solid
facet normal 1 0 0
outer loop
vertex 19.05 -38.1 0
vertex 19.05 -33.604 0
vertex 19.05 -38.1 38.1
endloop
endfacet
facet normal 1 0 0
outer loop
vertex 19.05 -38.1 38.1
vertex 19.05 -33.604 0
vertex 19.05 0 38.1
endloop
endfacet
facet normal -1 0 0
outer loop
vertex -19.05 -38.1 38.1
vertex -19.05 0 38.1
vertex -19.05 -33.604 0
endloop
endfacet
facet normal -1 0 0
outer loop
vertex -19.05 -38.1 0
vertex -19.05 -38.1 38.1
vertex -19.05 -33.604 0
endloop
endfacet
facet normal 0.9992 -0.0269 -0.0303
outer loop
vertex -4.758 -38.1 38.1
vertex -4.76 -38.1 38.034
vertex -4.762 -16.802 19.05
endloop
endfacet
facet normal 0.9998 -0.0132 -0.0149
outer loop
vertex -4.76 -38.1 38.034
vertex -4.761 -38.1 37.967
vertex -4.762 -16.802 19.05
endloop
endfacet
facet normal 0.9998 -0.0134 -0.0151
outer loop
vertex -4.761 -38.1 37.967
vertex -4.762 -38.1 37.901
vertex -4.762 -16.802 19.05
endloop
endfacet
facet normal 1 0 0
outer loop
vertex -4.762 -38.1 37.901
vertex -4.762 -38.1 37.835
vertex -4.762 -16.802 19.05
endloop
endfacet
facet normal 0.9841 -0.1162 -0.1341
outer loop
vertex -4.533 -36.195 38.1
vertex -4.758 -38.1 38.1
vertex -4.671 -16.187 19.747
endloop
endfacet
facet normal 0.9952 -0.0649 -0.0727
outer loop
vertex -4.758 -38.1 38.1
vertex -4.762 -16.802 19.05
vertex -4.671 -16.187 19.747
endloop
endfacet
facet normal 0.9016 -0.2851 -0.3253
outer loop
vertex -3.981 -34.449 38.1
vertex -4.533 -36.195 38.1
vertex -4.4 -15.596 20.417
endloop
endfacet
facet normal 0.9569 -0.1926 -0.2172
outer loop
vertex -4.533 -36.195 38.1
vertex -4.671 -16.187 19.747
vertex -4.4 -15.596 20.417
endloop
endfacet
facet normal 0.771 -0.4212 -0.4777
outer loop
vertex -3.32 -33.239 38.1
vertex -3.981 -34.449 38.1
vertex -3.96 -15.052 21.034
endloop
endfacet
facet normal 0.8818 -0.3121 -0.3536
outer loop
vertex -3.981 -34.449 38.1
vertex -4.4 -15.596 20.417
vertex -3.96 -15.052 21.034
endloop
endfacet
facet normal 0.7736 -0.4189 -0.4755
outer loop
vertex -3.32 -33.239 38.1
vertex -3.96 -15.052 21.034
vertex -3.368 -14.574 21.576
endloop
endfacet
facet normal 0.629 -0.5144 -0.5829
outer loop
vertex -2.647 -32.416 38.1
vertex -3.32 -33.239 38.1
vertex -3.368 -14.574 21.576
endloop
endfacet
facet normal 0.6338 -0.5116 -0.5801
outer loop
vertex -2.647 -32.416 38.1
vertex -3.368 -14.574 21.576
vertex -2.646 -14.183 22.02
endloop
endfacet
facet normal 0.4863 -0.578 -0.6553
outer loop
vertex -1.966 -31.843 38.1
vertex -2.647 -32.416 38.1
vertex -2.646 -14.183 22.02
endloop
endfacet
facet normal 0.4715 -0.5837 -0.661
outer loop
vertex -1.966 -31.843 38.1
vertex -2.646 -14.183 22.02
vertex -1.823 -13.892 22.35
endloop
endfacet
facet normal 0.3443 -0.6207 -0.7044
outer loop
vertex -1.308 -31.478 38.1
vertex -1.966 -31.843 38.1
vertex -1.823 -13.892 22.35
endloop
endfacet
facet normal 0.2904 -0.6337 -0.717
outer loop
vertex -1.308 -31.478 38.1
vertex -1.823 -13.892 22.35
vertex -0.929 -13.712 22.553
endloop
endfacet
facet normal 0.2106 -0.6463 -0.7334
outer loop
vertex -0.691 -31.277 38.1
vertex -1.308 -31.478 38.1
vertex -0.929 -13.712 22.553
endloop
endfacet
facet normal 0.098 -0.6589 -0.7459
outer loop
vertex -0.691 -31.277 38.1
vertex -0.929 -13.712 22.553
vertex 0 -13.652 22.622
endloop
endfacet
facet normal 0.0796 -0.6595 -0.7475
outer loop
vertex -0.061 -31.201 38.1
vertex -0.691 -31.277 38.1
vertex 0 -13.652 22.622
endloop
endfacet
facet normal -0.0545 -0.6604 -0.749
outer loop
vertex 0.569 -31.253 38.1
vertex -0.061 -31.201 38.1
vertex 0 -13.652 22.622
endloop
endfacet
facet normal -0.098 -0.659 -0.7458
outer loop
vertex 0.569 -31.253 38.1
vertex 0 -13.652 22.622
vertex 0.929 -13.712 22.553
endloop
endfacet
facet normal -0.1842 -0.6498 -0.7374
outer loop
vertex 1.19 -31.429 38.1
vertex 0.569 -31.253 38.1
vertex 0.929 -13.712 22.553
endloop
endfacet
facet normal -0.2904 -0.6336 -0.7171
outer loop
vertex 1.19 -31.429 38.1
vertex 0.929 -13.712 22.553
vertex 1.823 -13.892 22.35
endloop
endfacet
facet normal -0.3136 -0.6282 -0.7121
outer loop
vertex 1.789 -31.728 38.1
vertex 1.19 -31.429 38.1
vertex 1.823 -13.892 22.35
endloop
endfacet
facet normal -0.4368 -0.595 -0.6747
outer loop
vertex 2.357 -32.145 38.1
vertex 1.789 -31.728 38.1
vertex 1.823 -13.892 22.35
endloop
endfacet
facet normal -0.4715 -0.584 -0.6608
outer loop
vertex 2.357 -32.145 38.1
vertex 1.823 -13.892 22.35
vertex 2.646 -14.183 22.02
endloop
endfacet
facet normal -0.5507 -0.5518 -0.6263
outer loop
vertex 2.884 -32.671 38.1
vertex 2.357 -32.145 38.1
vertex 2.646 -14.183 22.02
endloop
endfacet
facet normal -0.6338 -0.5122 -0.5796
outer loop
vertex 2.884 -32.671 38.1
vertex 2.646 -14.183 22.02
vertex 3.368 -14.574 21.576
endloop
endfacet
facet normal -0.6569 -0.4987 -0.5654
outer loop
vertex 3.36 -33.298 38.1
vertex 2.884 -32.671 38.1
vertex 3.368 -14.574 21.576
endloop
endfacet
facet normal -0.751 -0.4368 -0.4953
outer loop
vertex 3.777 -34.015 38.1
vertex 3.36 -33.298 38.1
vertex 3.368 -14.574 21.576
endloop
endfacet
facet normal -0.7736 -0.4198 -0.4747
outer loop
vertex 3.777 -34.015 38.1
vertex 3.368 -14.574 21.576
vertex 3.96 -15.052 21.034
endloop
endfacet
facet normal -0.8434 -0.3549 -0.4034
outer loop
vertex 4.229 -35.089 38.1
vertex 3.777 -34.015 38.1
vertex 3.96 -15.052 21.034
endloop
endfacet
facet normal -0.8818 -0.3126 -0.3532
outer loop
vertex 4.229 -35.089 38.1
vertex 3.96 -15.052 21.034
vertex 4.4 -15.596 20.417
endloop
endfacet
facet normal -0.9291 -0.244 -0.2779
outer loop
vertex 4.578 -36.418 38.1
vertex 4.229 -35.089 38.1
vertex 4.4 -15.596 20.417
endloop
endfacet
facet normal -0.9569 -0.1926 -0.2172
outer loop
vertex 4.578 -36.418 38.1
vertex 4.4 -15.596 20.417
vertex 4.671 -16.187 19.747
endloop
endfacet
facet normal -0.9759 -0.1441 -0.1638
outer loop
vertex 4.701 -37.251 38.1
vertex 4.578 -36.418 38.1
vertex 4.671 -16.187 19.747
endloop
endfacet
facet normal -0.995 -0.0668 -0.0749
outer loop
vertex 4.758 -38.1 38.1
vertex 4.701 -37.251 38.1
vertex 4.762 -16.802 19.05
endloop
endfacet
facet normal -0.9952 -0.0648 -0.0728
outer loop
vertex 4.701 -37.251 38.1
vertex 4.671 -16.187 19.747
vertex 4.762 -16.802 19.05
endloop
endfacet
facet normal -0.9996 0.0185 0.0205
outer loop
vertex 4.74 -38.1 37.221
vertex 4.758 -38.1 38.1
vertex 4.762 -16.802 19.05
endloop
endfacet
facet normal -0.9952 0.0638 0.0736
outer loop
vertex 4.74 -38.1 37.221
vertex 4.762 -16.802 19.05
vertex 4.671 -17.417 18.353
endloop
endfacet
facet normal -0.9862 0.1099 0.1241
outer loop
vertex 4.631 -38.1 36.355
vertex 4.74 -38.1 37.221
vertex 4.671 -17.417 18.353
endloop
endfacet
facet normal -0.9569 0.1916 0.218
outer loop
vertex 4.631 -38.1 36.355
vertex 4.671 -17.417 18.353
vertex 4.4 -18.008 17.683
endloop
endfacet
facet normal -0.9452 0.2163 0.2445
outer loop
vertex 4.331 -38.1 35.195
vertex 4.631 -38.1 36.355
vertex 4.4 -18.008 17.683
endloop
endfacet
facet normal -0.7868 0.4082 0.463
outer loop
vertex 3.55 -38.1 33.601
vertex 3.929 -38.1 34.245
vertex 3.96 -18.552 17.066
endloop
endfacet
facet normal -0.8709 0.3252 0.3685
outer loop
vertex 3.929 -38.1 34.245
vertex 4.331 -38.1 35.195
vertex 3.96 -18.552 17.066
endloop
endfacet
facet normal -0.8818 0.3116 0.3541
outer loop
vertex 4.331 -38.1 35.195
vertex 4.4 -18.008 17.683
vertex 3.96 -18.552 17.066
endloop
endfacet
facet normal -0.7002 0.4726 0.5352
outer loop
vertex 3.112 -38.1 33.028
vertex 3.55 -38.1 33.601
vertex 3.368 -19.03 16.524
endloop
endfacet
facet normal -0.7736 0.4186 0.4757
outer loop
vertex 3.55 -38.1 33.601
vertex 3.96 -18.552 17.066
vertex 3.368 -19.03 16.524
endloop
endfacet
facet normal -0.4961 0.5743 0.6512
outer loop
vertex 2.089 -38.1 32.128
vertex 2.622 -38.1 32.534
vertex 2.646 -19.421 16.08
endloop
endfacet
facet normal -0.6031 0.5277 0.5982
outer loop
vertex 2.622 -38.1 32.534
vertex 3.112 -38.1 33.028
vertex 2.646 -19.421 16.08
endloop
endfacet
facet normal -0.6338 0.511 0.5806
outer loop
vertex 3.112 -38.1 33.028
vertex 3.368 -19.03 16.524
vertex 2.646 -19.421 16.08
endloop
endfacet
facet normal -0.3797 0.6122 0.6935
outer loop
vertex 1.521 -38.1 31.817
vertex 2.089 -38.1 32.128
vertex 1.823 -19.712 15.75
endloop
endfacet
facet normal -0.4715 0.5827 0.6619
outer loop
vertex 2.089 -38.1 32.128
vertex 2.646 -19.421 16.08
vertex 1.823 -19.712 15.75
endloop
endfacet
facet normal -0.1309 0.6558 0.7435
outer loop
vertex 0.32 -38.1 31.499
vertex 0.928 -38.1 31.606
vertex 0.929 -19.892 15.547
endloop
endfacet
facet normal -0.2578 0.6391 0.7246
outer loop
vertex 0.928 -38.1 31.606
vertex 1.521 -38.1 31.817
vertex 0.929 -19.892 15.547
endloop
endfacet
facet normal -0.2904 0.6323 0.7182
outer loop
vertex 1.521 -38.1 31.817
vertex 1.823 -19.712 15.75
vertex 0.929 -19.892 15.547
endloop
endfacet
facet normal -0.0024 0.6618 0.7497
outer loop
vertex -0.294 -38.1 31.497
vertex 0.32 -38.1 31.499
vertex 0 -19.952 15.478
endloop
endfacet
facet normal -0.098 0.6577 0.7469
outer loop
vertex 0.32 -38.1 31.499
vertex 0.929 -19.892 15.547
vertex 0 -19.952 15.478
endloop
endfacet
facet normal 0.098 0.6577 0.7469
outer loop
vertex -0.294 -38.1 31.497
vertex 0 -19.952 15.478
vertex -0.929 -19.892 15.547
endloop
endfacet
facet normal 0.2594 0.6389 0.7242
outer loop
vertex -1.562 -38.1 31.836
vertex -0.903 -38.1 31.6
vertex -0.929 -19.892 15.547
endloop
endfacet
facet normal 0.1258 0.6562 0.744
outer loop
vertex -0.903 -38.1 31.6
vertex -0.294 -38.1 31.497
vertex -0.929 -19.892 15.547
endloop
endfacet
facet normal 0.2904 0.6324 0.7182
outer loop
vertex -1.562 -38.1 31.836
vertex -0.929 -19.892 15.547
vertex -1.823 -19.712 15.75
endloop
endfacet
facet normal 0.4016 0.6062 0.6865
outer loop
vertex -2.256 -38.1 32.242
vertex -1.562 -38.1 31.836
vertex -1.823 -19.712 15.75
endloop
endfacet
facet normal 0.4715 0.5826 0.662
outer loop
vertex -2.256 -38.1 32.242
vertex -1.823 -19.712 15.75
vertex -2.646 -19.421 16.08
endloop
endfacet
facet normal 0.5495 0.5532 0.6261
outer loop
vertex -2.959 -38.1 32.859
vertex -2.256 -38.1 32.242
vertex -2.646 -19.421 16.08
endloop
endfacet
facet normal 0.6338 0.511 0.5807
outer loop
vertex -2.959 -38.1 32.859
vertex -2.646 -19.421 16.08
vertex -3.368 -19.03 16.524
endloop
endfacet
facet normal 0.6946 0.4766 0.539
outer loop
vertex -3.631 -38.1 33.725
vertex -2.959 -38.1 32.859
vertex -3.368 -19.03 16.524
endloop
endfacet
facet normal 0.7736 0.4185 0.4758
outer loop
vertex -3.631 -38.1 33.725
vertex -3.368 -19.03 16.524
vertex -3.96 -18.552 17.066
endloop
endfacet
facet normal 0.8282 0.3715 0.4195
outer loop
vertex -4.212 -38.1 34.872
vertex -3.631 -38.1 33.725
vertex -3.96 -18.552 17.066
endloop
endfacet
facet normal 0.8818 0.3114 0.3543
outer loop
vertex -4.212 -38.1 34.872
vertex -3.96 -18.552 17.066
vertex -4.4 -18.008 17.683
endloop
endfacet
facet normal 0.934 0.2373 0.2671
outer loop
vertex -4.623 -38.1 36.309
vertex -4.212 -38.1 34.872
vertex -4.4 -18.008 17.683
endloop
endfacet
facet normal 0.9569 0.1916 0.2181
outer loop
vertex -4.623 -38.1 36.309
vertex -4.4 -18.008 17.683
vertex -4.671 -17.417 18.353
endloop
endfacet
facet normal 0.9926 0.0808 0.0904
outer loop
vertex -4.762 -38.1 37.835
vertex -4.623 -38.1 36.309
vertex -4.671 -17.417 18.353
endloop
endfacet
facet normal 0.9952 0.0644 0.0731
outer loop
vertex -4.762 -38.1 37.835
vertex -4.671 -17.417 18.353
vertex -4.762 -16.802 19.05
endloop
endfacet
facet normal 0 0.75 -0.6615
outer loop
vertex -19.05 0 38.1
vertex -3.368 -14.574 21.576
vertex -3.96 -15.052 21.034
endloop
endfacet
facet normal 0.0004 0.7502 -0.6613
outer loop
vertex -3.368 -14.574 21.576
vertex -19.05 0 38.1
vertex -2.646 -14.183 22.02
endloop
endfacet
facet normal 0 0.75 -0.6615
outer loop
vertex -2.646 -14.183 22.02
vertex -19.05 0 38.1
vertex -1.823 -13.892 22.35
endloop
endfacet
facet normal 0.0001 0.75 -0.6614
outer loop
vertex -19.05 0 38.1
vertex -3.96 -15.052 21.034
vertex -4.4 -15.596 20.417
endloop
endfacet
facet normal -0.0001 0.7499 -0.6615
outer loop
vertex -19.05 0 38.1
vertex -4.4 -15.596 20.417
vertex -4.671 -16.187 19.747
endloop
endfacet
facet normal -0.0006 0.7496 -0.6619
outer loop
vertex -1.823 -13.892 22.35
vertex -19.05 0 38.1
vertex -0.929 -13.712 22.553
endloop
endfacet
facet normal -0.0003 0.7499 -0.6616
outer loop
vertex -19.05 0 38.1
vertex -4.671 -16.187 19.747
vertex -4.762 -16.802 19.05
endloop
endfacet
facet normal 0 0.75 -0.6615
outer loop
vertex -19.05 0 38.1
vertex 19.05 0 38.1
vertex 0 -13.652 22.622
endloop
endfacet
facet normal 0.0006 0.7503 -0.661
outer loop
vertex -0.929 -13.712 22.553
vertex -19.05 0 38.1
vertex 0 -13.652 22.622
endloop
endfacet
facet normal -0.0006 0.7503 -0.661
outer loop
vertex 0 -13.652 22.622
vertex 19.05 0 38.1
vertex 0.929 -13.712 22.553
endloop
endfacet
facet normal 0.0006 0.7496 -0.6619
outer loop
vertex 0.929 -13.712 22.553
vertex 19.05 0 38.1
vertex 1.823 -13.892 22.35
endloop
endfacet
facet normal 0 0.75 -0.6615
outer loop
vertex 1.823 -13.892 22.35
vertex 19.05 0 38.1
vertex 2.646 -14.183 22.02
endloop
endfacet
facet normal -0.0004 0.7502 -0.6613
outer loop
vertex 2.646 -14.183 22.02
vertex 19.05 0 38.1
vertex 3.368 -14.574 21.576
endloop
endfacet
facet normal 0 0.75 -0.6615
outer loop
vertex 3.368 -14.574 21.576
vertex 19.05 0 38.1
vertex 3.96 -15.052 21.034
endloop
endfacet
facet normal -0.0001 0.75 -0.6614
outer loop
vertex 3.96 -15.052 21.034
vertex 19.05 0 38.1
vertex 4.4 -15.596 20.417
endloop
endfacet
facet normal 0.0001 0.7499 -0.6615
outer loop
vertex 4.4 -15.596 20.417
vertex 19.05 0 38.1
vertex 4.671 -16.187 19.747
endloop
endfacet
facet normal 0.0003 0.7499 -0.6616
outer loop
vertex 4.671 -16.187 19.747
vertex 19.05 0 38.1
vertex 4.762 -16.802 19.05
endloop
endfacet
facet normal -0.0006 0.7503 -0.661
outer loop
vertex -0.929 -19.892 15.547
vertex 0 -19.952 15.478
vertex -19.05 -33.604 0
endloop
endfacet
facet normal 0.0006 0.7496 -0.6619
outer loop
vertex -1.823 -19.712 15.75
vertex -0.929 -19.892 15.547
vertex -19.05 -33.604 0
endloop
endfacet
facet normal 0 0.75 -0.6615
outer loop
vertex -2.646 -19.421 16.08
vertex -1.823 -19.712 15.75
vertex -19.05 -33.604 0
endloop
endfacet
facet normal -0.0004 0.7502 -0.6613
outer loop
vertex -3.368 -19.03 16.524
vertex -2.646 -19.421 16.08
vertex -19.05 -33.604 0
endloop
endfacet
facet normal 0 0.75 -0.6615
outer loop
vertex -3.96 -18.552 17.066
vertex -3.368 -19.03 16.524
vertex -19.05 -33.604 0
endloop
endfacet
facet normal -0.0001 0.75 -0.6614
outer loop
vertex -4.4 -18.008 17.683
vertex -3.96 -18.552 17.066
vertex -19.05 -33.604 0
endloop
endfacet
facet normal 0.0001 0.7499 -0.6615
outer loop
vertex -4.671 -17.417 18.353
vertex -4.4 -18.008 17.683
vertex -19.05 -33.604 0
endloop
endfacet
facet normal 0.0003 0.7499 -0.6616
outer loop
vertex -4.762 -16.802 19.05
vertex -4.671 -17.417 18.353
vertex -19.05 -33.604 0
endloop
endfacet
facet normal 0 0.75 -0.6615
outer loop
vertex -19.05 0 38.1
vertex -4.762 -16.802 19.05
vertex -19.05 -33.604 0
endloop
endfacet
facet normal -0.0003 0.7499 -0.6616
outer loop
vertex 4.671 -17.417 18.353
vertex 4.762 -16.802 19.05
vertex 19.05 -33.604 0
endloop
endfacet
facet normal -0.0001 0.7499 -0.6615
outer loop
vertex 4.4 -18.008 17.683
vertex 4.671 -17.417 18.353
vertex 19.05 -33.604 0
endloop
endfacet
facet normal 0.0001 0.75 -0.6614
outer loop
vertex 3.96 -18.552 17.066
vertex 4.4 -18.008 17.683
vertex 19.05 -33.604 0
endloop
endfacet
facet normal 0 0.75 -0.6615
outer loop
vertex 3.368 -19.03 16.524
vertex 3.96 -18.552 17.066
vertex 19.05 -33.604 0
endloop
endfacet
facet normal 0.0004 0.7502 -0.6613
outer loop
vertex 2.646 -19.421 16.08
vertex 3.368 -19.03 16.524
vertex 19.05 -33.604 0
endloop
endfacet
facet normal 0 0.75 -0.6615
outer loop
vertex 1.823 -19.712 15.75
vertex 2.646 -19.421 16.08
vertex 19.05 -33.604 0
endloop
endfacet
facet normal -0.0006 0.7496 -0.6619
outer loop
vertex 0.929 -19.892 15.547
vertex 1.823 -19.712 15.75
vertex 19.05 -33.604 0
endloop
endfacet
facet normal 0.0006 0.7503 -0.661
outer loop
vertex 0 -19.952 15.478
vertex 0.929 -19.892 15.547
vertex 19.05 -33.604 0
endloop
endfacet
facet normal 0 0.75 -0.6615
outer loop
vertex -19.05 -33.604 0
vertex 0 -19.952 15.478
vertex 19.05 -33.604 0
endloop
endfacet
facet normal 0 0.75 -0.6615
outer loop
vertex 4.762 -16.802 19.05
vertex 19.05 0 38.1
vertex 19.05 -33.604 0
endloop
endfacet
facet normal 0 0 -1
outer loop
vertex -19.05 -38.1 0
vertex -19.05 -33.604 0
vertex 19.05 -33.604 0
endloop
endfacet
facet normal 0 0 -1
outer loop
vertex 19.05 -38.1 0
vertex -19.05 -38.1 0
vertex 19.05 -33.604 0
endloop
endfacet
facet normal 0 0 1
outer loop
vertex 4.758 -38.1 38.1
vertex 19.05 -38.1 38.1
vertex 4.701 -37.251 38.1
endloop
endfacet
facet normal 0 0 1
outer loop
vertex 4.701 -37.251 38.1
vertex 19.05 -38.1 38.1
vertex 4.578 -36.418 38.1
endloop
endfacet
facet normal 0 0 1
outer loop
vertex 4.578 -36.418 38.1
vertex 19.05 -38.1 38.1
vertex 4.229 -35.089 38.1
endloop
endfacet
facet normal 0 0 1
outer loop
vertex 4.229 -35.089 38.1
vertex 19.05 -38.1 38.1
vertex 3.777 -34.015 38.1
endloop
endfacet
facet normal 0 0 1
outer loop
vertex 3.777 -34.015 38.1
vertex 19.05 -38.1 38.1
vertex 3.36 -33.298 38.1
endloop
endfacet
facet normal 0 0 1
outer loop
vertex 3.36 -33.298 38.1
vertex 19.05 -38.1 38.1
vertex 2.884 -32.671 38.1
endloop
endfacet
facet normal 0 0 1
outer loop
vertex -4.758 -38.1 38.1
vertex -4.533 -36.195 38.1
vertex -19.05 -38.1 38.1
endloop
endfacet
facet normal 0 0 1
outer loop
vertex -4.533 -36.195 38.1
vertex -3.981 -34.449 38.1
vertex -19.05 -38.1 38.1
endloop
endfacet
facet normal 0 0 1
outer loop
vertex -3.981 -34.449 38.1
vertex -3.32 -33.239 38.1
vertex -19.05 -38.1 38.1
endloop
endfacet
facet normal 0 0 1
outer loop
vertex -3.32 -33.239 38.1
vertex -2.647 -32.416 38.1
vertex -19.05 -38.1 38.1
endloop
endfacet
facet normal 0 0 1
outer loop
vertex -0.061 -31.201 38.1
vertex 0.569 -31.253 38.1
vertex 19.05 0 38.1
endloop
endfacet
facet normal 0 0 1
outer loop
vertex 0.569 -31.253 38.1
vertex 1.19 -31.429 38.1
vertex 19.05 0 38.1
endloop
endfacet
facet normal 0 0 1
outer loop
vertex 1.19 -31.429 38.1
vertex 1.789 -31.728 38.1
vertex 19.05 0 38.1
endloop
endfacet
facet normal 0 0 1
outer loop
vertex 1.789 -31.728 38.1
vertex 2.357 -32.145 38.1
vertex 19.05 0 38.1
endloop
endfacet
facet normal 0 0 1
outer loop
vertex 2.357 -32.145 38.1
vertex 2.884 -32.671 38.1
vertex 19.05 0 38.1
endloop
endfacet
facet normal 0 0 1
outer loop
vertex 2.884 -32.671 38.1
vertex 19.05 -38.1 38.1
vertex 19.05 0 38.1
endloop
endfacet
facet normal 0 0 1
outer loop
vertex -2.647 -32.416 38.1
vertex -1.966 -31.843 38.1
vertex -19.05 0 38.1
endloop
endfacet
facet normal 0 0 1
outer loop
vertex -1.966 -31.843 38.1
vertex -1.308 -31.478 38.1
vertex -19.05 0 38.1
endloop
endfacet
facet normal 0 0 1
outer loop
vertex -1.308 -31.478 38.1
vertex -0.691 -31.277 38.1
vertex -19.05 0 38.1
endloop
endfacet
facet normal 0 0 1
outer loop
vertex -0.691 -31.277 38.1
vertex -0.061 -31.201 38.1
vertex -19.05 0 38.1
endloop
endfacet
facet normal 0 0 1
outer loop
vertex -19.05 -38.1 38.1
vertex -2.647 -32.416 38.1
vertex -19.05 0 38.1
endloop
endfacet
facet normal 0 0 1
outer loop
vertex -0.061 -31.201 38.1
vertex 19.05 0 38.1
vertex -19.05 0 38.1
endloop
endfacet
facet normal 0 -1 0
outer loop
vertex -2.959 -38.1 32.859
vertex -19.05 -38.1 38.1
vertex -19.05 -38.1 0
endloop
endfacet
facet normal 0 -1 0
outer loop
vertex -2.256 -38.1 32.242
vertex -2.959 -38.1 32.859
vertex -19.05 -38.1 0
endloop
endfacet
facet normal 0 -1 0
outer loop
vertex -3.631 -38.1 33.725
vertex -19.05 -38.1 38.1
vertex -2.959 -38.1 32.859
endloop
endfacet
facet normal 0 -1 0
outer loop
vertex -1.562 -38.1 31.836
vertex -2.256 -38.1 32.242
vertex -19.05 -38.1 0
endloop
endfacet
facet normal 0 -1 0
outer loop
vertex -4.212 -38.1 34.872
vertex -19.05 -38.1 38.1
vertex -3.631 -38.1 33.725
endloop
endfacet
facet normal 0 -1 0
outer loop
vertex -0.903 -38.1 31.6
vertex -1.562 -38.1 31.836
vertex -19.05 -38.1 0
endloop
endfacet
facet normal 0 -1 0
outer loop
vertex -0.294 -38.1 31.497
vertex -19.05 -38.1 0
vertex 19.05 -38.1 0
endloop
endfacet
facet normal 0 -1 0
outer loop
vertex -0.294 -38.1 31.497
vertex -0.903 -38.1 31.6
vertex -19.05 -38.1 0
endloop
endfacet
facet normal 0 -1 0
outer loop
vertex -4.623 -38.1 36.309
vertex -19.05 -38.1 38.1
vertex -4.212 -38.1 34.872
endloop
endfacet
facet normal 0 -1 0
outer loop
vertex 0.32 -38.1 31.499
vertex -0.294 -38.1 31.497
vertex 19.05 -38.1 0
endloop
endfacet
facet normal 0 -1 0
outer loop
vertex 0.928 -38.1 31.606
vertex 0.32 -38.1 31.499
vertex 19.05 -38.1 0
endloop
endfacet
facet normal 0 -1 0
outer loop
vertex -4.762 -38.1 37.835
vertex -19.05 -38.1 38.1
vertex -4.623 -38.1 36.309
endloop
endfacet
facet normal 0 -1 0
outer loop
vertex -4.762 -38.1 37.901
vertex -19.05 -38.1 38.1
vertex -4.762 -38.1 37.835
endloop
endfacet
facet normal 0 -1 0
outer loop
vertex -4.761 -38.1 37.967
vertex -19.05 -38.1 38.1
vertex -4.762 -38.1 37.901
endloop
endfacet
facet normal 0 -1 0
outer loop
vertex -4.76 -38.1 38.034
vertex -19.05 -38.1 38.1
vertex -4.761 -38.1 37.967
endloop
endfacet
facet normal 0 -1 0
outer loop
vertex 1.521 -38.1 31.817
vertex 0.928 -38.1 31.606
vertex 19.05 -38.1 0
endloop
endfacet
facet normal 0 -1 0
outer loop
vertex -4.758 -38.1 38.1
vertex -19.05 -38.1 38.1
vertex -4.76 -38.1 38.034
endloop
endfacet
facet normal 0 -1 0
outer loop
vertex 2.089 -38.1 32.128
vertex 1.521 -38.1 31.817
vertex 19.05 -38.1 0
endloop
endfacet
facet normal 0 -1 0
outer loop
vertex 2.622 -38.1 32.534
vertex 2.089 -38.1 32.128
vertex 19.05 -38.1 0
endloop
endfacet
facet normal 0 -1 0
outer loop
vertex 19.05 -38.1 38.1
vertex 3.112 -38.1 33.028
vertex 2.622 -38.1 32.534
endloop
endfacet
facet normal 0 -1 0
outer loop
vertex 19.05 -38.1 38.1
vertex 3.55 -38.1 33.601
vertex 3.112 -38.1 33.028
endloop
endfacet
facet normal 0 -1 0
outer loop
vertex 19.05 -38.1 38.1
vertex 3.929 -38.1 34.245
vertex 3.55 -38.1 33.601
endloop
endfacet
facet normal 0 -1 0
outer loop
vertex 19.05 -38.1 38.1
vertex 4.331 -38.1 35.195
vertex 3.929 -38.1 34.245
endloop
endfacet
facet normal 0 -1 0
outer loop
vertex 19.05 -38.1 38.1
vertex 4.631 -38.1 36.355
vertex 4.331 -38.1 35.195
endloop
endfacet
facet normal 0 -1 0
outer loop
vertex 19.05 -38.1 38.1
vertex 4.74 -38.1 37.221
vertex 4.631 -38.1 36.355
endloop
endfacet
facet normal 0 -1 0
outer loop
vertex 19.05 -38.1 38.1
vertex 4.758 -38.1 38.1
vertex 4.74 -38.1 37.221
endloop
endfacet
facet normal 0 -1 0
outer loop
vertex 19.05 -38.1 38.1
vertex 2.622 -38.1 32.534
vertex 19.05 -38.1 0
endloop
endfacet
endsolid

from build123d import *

# Parameters (mm, degrees)
F1_DEPTH      = 38.1
F3_DEPTH      = 19.051
F3_DEPTH_BACK = 19.051
F4_R          = 4.7625
F5_DEPTH      = 28.5749043881


with BuildPart() as f1:
    # F0 (on Front) → F1 (new body)
    with BuildSketch(Plane.XZ):
        Polygon((-19.05, 38.1), (-19.05, 0), (0, 0), (19.05, 0), (19.05, 38.1), align=None)
    extrude(amount=F1_DEPTH)

    # F2 (on Right) → F3 (cut, two sides)
    with BuildSketch(Plane.YZ) as f3_sk:
        Polygon((-33.6039864189, 0), (0, 0), (0, 38.1), align=None)
    extrude(amount=-F3_DEPTH, mode=Mode.SUBTRACT)
    extrude(f3_sk.sketch, amount=F3_DEPTH_BACK, mode=Mode.SUBTRACT)

    # F4 (on face) → F5 (cut, through all)
    with BuildSketch(Plane(origin=(0, -18.9007929031, 16.6703933864), x_dir=(-1, 0, 0), z_dir=(0, 0.7499712438, -0.6614704328))):
        with Locations((0, 3.1729304735)):
            Circle(F4_R)
    extrude(amount=-F5_DEPTH, mode=Mode.SUBTRACT)


solid = f1.part
